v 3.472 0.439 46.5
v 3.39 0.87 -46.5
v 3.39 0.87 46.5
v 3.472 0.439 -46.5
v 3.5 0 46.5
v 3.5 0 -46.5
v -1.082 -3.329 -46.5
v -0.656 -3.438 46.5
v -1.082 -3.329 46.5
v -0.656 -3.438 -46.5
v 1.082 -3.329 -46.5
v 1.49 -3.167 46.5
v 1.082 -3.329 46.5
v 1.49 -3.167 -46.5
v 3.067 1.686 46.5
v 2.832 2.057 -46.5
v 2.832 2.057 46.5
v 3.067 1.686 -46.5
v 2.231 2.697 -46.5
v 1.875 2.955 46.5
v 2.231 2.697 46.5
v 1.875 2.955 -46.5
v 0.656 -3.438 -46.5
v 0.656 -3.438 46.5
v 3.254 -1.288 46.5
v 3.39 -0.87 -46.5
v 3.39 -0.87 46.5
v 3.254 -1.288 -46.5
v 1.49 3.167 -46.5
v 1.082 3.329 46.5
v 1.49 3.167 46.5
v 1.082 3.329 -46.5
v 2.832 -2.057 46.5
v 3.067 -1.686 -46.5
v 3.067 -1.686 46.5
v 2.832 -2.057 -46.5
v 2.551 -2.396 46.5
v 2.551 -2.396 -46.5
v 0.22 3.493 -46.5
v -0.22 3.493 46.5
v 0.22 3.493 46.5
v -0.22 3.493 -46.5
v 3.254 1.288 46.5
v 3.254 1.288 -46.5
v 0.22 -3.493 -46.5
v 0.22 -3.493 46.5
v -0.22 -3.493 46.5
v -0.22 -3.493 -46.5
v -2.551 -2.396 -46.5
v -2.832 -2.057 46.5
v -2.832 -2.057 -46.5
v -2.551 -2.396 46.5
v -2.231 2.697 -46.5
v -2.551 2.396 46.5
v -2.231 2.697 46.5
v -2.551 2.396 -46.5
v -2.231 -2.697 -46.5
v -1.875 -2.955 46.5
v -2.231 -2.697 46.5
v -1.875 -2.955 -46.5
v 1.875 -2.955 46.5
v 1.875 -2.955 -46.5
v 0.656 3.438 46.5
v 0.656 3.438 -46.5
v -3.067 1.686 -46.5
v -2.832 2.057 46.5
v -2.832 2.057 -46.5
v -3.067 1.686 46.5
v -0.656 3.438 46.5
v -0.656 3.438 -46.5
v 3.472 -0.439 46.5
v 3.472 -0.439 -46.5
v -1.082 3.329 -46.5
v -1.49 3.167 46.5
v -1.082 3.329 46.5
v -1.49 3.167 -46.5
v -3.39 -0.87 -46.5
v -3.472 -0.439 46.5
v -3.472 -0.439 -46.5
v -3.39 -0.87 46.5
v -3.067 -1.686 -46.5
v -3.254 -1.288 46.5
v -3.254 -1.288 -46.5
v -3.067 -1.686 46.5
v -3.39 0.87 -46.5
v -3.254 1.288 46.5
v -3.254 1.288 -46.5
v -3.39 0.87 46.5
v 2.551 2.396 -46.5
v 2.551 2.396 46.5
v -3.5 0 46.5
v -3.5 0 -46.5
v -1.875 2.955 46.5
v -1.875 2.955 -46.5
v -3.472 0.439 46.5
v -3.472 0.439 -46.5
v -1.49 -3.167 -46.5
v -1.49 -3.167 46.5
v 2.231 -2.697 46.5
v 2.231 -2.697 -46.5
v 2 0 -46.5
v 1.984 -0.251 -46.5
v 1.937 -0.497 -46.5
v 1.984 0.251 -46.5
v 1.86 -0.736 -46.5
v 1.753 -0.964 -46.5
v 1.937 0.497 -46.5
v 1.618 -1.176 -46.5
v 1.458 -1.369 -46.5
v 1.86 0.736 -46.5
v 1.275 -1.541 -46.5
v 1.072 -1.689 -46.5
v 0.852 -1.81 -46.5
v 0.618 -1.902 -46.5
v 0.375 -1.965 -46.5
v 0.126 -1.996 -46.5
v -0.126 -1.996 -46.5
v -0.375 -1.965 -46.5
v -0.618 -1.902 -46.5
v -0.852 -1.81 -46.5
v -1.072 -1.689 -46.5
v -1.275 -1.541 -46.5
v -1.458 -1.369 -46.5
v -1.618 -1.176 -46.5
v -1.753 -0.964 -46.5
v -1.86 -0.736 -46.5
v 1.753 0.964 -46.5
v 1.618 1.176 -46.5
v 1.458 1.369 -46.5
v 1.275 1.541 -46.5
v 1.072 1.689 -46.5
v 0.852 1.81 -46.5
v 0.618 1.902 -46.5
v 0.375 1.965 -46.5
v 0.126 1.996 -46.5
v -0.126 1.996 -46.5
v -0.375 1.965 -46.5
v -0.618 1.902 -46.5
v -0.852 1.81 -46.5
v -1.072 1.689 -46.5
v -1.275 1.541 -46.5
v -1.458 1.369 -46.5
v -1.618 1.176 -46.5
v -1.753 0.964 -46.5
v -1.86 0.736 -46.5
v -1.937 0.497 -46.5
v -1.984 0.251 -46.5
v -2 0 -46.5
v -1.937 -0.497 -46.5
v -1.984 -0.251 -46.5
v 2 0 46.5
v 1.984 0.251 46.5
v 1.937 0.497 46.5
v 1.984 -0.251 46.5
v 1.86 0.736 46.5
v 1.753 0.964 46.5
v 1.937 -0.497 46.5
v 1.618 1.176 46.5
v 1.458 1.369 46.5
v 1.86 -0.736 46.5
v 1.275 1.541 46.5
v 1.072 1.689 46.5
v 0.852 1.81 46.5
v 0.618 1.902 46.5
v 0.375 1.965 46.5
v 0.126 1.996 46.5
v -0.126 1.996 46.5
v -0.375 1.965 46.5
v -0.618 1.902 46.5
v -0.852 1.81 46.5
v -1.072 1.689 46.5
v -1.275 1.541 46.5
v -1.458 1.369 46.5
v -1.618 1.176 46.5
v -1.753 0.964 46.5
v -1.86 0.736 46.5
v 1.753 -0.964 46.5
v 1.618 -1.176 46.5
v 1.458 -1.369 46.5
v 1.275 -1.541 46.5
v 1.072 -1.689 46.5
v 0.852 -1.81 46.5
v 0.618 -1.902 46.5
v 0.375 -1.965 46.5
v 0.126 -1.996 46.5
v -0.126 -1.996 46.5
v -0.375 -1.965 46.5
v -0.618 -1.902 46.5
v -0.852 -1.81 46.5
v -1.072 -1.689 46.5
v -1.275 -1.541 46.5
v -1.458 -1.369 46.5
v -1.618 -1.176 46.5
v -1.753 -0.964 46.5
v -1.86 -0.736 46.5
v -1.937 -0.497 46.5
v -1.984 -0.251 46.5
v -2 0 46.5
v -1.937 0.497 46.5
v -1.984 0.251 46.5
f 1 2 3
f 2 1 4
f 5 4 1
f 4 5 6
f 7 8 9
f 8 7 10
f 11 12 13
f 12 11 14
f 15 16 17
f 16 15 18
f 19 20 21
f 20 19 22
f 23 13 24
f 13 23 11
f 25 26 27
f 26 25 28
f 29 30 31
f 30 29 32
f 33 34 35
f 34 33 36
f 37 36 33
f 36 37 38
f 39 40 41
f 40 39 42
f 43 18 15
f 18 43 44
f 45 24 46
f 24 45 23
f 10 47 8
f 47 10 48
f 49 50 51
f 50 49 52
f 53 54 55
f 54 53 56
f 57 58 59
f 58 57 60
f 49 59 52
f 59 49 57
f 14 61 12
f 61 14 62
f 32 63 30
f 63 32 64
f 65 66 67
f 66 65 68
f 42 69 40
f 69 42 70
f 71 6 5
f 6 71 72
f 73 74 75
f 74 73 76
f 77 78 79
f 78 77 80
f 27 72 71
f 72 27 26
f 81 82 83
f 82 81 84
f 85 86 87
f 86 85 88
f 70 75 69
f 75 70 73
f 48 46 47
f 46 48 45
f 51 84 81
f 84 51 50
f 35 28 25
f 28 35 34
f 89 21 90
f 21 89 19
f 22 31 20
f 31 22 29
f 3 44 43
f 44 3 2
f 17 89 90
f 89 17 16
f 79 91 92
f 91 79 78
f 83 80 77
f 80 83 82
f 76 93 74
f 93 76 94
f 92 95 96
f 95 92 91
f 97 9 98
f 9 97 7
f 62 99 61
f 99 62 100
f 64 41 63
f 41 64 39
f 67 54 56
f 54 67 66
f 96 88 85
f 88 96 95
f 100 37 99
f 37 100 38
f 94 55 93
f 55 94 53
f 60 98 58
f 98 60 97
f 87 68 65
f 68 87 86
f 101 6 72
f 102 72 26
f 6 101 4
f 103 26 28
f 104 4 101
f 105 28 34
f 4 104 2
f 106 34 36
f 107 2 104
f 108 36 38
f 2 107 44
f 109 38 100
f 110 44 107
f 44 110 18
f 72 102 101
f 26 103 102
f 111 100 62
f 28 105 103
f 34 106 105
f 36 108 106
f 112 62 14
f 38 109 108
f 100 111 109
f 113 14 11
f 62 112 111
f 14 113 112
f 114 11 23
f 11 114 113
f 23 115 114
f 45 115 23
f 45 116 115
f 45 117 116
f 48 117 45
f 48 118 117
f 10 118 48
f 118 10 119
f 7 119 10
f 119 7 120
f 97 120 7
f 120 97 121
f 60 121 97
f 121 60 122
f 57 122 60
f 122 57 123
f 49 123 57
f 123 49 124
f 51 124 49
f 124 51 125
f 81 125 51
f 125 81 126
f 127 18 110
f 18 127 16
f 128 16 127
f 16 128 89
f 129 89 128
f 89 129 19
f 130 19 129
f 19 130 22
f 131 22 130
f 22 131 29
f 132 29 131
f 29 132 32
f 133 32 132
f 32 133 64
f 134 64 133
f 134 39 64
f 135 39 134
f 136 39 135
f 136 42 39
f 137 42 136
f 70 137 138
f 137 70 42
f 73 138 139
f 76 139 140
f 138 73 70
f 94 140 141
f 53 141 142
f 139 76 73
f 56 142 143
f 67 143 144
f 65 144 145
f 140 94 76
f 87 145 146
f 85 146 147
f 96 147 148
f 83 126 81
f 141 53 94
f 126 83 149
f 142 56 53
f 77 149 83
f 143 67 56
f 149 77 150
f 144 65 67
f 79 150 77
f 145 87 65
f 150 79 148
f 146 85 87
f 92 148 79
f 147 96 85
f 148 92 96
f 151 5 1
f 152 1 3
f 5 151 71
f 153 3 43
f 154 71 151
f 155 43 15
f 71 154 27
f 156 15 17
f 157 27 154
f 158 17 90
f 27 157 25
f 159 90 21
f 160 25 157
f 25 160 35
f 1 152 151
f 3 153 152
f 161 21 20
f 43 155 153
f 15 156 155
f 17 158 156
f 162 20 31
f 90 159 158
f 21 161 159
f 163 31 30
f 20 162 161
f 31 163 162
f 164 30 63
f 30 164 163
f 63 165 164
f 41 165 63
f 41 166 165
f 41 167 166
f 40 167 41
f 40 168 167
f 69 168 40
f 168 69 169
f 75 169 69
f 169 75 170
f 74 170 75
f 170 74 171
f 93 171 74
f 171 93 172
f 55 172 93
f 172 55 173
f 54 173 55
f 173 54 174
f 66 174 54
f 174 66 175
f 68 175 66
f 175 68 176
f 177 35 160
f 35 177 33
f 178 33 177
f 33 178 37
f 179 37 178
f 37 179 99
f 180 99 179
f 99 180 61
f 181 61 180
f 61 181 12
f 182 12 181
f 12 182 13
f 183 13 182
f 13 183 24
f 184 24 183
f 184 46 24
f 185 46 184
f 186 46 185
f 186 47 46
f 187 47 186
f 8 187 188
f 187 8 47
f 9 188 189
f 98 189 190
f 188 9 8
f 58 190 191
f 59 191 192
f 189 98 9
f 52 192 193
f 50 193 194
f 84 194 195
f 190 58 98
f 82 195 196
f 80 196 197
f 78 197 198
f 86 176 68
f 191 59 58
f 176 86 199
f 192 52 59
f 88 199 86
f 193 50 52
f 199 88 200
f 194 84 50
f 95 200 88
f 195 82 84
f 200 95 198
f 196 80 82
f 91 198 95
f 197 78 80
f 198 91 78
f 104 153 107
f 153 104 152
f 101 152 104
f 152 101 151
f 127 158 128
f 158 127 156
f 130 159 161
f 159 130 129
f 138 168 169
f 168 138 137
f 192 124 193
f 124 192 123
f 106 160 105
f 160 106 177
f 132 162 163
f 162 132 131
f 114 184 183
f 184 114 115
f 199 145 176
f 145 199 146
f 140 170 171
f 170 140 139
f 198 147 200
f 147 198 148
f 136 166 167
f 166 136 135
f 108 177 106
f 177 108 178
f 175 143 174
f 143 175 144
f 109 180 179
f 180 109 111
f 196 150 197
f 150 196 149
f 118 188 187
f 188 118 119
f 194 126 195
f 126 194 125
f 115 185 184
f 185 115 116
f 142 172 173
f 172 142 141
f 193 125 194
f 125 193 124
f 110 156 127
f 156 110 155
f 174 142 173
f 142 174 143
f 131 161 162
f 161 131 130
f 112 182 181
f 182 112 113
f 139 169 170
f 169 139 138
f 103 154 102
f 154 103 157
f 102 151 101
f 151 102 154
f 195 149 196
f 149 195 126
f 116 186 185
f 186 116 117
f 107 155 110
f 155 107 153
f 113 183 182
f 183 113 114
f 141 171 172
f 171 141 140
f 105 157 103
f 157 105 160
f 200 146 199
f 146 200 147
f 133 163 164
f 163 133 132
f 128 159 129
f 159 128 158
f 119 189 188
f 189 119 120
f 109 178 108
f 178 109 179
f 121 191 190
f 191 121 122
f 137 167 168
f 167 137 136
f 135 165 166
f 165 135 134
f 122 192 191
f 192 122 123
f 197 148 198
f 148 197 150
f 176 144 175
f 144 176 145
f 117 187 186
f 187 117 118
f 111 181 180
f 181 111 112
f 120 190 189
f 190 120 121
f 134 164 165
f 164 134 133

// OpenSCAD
$fn = 50;


difference() {
	union() {
		translate(v = [0, 0, -46.5000000000]) {
			cylinder(h = 93, r = 3.5000000000);
		}
	}
	union() {
		translate(v = [0, 0, -100.0000000000]) {
			cylinder(h = 200, r = 2.0000000000);
		}
	}
}
